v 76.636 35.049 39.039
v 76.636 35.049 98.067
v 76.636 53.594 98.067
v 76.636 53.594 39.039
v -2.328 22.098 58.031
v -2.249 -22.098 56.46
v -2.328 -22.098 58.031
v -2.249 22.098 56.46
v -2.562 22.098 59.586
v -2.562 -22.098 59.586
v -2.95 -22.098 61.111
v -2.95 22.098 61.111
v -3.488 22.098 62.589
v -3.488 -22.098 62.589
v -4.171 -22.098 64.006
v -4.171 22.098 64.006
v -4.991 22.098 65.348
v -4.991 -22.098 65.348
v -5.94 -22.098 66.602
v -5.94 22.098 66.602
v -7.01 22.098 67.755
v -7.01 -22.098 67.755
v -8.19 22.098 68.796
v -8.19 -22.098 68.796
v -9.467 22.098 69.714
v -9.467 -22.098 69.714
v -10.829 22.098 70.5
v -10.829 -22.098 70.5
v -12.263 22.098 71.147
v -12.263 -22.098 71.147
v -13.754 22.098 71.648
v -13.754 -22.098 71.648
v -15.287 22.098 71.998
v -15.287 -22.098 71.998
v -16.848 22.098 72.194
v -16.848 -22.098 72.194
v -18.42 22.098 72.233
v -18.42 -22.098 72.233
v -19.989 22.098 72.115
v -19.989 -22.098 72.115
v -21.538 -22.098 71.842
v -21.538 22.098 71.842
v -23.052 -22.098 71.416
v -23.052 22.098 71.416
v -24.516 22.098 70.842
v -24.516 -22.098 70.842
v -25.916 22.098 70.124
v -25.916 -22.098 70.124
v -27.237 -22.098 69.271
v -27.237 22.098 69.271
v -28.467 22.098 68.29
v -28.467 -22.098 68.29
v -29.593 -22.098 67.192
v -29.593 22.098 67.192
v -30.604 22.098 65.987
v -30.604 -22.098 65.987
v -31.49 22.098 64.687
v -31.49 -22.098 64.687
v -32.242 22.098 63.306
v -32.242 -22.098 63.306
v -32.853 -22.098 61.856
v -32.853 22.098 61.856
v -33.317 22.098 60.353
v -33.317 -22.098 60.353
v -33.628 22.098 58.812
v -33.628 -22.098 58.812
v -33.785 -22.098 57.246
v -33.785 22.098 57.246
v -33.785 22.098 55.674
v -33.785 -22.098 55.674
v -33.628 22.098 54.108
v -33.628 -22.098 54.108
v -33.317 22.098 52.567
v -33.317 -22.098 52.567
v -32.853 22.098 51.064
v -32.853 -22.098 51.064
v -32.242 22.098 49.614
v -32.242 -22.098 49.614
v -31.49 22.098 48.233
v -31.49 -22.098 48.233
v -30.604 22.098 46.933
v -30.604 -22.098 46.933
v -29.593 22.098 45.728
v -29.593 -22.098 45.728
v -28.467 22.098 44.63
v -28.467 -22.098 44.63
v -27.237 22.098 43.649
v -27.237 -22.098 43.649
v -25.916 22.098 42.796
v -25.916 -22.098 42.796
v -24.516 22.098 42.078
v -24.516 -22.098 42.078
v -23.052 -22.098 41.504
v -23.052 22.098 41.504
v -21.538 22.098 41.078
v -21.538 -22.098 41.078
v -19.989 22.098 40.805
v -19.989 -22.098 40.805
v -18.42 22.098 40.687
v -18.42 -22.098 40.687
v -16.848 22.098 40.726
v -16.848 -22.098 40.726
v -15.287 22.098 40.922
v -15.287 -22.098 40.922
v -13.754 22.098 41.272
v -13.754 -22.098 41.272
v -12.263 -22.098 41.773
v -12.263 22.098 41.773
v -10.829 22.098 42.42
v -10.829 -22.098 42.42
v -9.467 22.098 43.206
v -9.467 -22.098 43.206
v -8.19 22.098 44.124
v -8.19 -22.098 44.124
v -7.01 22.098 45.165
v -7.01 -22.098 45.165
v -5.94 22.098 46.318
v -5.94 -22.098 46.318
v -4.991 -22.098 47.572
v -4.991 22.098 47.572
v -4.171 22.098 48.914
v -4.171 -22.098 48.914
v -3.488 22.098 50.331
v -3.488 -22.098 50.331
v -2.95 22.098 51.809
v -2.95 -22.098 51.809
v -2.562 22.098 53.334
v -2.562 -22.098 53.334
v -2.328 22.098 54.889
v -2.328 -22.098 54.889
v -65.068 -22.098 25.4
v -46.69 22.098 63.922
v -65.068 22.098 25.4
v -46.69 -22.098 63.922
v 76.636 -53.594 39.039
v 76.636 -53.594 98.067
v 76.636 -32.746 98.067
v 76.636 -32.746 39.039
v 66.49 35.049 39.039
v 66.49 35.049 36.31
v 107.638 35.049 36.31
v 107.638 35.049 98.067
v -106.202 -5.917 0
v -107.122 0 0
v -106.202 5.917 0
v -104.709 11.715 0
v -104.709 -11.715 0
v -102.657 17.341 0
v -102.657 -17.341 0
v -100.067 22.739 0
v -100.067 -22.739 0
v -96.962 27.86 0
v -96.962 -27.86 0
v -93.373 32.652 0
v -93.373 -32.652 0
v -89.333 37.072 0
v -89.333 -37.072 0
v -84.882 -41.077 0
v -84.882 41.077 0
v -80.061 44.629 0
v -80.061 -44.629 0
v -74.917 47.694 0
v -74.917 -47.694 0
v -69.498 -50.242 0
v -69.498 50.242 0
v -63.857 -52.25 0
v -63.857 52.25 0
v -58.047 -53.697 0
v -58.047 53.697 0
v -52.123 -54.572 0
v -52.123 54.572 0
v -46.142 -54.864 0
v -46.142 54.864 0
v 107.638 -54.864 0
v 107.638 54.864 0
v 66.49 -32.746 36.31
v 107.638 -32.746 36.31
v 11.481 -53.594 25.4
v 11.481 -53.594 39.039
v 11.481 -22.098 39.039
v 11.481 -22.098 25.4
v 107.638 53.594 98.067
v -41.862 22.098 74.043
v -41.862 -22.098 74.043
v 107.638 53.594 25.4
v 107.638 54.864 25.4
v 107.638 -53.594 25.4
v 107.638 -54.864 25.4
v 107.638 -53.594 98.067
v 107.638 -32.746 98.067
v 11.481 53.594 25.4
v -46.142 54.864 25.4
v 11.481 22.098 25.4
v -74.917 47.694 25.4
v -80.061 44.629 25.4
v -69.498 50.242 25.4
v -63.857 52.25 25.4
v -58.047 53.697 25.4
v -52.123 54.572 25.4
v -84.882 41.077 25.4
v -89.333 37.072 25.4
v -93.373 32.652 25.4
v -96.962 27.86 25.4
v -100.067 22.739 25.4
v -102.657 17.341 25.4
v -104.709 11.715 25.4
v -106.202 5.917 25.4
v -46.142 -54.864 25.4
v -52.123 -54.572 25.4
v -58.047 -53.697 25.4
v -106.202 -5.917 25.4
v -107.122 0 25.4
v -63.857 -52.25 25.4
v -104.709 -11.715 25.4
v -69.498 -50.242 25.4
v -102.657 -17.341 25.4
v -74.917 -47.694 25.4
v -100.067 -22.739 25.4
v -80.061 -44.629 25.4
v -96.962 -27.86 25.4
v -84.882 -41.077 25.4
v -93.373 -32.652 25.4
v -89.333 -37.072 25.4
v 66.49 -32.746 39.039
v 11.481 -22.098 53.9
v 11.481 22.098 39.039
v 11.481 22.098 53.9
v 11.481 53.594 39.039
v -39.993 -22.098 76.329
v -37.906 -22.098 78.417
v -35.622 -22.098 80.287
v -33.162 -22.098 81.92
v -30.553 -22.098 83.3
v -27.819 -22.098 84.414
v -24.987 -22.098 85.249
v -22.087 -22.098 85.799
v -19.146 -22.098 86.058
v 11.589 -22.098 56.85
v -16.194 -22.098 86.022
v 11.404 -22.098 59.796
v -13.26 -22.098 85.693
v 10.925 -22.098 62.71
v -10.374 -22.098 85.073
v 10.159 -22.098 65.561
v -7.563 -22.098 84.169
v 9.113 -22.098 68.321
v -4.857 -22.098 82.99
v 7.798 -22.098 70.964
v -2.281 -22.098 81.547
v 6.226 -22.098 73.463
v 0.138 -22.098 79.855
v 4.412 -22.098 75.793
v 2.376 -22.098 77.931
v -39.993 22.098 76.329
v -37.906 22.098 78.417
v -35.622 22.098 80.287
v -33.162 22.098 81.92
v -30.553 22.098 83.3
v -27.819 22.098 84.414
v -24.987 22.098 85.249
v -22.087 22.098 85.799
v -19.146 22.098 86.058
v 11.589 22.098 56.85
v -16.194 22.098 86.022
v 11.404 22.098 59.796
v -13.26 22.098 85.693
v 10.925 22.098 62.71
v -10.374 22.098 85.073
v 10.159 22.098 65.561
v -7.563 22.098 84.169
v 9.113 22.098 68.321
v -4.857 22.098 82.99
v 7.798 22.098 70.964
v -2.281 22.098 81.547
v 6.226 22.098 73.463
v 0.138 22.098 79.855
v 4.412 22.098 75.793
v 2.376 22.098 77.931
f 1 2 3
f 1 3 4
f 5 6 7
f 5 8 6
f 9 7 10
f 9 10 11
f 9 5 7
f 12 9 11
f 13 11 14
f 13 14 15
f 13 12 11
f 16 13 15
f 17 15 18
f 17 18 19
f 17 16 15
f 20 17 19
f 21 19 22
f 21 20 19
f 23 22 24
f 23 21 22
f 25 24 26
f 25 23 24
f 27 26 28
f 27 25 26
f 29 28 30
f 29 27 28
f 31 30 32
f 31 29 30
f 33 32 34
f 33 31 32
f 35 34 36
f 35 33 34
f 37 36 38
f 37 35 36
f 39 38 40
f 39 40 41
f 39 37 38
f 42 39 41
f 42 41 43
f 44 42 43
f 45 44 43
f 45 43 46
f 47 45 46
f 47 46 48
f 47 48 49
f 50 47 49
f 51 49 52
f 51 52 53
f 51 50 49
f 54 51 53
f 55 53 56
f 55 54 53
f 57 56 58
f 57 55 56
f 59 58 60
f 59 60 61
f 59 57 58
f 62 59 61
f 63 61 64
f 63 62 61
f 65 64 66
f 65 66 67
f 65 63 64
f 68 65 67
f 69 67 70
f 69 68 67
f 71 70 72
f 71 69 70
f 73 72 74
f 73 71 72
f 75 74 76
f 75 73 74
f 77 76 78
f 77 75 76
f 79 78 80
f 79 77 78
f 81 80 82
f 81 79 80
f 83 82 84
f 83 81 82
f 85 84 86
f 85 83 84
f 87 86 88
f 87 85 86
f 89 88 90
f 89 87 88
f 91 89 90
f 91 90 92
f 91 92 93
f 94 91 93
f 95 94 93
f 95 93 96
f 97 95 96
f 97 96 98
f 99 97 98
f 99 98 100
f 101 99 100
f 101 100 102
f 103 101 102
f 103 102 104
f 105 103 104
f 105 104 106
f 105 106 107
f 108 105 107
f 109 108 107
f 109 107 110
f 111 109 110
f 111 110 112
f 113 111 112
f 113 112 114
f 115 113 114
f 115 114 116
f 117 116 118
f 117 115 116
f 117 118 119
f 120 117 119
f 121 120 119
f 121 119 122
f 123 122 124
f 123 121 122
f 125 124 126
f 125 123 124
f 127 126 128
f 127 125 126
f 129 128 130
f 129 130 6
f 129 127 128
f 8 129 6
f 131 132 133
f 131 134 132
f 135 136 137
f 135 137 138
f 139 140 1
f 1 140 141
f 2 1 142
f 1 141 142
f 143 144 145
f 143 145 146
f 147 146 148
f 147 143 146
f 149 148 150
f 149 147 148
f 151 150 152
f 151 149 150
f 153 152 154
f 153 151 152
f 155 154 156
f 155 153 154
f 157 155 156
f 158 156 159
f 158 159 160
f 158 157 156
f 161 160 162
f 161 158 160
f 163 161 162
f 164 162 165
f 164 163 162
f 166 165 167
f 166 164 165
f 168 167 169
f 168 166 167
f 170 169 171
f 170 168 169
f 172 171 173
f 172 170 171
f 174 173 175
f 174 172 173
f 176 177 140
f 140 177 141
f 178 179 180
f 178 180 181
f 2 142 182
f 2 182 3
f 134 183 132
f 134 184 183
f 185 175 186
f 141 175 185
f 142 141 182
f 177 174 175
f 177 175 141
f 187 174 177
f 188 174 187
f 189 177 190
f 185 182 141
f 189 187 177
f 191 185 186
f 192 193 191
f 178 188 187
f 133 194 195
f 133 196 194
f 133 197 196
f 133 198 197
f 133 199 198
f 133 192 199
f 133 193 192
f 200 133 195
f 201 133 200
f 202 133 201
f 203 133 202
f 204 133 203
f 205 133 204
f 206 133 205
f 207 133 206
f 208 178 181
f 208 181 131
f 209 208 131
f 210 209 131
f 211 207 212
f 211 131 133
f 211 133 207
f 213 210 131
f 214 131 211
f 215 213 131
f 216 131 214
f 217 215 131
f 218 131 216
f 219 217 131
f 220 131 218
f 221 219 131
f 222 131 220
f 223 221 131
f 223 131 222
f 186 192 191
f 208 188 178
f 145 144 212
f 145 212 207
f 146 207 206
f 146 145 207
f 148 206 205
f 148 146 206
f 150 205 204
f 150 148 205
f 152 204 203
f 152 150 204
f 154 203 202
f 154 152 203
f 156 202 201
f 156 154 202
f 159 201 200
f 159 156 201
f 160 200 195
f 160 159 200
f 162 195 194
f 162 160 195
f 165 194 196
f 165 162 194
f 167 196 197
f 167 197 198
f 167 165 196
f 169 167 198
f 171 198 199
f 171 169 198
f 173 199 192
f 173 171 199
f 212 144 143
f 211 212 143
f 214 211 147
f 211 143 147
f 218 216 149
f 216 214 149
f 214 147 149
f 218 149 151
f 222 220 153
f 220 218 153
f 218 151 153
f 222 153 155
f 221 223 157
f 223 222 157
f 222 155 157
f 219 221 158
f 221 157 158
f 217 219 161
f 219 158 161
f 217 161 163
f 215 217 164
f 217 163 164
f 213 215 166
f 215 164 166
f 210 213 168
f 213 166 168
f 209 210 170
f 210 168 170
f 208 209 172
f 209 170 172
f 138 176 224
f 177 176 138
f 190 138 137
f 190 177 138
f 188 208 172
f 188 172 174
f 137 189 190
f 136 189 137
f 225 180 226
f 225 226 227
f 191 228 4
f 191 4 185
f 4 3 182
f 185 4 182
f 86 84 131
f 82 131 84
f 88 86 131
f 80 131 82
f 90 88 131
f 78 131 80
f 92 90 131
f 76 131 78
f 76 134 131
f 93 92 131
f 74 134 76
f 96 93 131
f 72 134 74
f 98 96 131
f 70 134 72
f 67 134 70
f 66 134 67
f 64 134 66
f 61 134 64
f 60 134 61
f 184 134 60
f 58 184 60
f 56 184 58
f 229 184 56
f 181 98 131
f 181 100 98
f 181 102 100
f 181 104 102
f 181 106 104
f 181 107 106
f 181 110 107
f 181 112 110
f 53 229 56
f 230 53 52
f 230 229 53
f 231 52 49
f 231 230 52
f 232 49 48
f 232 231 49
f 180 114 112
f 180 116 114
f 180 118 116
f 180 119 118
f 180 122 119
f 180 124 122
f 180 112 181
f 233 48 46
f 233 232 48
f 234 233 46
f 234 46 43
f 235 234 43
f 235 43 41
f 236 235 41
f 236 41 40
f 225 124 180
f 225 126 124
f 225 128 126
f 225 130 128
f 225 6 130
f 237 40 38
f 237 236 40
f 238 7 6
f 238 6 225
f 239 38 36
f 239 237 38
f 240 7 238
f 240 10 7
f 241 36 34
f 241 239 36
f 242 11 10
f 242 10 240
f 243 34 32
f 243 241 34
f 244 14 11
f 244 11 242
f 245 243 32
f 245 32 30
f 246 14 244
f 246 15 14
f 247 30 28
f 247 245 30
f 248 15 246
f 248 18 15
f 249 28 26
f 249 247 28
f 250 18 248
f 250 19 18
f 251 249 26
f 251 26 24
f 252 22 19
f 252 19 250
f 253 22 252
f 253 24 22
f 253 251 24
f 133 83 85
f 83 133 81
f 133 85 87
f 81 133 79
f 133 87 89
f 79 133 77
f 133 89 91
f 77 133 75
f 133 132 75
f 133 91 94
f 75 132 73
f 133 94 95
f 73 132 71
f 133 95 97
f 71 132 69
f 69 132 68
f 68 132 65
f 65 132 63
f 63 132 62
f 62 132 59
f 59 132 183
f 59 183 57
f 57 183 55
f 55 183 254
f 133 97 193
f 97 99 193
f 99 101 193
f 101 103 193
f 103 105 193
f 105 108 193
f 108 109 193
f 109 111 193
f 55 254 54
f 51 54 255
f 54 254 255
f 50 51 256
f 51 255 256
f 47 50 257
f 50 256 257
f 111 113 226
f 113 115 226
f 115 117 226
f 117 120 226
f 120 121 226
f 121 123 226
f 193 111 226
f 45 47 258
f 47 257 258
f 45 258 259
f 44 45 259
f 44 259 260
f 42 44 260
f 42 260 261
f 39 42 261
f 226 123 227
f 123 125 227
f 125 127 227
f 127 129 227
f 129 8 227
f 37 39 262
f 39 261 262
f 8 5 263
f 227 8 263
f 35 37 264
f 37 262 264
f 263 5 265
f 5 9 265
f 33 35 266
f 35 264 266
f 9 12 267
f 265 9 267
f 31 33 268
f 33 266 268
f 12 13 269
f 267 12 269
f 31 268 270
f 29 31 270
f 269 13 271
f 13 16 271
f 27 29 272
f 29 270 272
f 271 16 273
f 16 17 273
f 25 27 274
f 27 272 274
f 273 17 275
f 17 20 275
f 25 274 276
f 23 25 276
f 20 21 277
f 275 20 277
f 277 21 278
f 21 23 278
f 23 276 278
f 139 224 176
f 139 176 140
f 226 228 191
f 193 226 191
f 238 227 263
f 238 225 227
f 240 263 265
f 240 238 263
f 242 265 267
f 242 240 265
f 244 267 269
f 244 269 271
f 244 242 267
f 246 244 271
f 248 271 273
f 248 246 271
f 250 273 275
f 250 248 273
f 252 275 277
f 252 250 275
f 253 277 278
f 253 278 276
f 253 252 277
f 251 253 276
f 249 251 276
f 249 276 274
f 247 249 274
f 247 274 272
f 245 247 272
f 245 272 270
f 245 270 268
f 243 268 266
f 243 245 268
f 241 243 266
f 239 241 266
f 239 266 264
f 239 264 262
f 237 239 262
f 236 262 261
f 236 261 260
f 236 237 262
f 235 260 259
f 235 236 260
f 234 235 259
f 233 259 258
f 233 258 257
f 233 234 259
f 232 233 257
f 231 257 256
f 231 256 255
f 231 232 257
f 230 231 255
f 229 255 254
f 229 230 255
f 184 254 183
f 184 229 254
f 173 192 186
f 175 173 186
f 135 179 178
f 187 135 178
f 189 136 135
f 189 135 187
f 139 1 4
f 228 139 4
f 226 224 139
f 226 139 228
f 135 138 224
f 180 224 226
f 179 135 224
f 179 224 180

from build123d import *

# Parameters (mm, degrees)
F1_DEPTH    = 54.864
F0_R        = 15.7777597409
F2_DEPTH    = 22.098
F3_DEPTH    = 53.594
F4_T1_DEPTH = 332.0051224214
F5_DEPTH    = 131.826
F6_W        = 67.7949339151
F6_H        = 61.7567202186
F7_DEPTH    = 41.148


# Not quite as in the source:
# - a fillet or chamfer that OpenCascade refuses, or shapes differently, is made with other operations: its cross-section is extruded or revolved along the edge and cut away or added


with BuildPart() as f1:
    # F0 (on Front) → F1 (new body, symmetric)
    with BuildSketch(Plane.XZ):
        Polygon((-107.4633456931, 25.4), (-107.4633456931, 0), (107.6379133128, 0), (107.6379133128, 25.4), (11.4811650322, 25.4), (-65.0678679326, 25.4), align=None)
    extrude(amount=F1_DEPTH, both=True)

    # F0 (on Front) → F2 (join, symmetric)
    with BuildSketch(Plane.XZ):
        with BuildLine():
            Line((-46.6904140055, 63.9219704105), (-65.0678679326, 25.4))
            Line((-65.0678679326, 25.4), (11.4811650322, 25.4))
            Line((11.4811650322, 25.4), (11.4811650322, 39.0391899168))
            Line((11.4811650322, 39.0391899168), (11.4811650322, 53.899857424))
            ThreePointArc((11.4811650322, 53.899857424), (-7.5633921192, 84.1691084188), (-41.8619237654, 74.0432287141))
            Line((-41.8619237654, 74.0432287141), (-46.6904140055, 63.9219704105))
        make_face()
        with Locations((-18.0268805863, 56.4600032051)):
            Circle(F0_R, mode=Mode.SUBTRACT)
    extrude(amount=F2_DEPTH, both=True)

    # F0 (on Front) → F3 (join, symmetric)
    with BuildSketch(Plane.XZ):
        Polygon((11.4811650322, 25.4), (107.6379133128, 25.4), (107.6379133128, 98.0671415215), (76.6363167746, 98.0671415215), (76.6363167746, 39.0391899168), (11.4811650322, 39.0391899168), align=None)
    extrude(amount=F3_DEPTH, both=True)

    # F4: fillet of radius 61.3210244843 on 2 edges, made by hand

    # F4_s2 → F4_t1 (cut)
    with BuildSketch(Plane.XY.offset(-153.3025612107)):
        with BuildLine():
            ThreePointArc((-107.4633456931, -6.4570244843), (-89.502833451, 36.9034877579), (-46.1423212089, 54.864))
            Line((-46.1423212089, 54.864), (-107.4633456931, 54.864))
            Line((-107.4633456931, 54.864), (-107.4633456931, -6.4570244843))
        make_face()
        with BuildLine():
            ThreePointArc((-107.4633456931, 6.4570244843), (-89.502833451, -36.9034877579), (-46.1423212089, -54.864))
            Line((-46.1423212089, -54.864), (-107.4633456931, -54.864))
            Line((-107.4633456931, -54.864), (-107.4633456931, 6.4570244843))
        make_face()
    extrude(amount=F4_T1_DEPTH, mode=Mode.SUBTRACT)

    # F0 (on Front) → F5 (cut)
    with BuildSketch(Plane.XZ):
        with Locations((-18.0268805863, 56.4600032051)):
            Circle(F0_R)
    extrude(amount=-F5_DEPTH, mode=Mode.SUBTRACT)

    # F6 (on face) → F7 (cut)
    with BuildSketch(Plane.YZ.offset(107.6379133128)):
        with Locations((1.151856035, 67.1887814122)):
            Rectangle(F6_W, F6_H)
    extrude(amount=-F7_DEPTH, mode=Mode.SUBTRACT)


solid = f1.part
